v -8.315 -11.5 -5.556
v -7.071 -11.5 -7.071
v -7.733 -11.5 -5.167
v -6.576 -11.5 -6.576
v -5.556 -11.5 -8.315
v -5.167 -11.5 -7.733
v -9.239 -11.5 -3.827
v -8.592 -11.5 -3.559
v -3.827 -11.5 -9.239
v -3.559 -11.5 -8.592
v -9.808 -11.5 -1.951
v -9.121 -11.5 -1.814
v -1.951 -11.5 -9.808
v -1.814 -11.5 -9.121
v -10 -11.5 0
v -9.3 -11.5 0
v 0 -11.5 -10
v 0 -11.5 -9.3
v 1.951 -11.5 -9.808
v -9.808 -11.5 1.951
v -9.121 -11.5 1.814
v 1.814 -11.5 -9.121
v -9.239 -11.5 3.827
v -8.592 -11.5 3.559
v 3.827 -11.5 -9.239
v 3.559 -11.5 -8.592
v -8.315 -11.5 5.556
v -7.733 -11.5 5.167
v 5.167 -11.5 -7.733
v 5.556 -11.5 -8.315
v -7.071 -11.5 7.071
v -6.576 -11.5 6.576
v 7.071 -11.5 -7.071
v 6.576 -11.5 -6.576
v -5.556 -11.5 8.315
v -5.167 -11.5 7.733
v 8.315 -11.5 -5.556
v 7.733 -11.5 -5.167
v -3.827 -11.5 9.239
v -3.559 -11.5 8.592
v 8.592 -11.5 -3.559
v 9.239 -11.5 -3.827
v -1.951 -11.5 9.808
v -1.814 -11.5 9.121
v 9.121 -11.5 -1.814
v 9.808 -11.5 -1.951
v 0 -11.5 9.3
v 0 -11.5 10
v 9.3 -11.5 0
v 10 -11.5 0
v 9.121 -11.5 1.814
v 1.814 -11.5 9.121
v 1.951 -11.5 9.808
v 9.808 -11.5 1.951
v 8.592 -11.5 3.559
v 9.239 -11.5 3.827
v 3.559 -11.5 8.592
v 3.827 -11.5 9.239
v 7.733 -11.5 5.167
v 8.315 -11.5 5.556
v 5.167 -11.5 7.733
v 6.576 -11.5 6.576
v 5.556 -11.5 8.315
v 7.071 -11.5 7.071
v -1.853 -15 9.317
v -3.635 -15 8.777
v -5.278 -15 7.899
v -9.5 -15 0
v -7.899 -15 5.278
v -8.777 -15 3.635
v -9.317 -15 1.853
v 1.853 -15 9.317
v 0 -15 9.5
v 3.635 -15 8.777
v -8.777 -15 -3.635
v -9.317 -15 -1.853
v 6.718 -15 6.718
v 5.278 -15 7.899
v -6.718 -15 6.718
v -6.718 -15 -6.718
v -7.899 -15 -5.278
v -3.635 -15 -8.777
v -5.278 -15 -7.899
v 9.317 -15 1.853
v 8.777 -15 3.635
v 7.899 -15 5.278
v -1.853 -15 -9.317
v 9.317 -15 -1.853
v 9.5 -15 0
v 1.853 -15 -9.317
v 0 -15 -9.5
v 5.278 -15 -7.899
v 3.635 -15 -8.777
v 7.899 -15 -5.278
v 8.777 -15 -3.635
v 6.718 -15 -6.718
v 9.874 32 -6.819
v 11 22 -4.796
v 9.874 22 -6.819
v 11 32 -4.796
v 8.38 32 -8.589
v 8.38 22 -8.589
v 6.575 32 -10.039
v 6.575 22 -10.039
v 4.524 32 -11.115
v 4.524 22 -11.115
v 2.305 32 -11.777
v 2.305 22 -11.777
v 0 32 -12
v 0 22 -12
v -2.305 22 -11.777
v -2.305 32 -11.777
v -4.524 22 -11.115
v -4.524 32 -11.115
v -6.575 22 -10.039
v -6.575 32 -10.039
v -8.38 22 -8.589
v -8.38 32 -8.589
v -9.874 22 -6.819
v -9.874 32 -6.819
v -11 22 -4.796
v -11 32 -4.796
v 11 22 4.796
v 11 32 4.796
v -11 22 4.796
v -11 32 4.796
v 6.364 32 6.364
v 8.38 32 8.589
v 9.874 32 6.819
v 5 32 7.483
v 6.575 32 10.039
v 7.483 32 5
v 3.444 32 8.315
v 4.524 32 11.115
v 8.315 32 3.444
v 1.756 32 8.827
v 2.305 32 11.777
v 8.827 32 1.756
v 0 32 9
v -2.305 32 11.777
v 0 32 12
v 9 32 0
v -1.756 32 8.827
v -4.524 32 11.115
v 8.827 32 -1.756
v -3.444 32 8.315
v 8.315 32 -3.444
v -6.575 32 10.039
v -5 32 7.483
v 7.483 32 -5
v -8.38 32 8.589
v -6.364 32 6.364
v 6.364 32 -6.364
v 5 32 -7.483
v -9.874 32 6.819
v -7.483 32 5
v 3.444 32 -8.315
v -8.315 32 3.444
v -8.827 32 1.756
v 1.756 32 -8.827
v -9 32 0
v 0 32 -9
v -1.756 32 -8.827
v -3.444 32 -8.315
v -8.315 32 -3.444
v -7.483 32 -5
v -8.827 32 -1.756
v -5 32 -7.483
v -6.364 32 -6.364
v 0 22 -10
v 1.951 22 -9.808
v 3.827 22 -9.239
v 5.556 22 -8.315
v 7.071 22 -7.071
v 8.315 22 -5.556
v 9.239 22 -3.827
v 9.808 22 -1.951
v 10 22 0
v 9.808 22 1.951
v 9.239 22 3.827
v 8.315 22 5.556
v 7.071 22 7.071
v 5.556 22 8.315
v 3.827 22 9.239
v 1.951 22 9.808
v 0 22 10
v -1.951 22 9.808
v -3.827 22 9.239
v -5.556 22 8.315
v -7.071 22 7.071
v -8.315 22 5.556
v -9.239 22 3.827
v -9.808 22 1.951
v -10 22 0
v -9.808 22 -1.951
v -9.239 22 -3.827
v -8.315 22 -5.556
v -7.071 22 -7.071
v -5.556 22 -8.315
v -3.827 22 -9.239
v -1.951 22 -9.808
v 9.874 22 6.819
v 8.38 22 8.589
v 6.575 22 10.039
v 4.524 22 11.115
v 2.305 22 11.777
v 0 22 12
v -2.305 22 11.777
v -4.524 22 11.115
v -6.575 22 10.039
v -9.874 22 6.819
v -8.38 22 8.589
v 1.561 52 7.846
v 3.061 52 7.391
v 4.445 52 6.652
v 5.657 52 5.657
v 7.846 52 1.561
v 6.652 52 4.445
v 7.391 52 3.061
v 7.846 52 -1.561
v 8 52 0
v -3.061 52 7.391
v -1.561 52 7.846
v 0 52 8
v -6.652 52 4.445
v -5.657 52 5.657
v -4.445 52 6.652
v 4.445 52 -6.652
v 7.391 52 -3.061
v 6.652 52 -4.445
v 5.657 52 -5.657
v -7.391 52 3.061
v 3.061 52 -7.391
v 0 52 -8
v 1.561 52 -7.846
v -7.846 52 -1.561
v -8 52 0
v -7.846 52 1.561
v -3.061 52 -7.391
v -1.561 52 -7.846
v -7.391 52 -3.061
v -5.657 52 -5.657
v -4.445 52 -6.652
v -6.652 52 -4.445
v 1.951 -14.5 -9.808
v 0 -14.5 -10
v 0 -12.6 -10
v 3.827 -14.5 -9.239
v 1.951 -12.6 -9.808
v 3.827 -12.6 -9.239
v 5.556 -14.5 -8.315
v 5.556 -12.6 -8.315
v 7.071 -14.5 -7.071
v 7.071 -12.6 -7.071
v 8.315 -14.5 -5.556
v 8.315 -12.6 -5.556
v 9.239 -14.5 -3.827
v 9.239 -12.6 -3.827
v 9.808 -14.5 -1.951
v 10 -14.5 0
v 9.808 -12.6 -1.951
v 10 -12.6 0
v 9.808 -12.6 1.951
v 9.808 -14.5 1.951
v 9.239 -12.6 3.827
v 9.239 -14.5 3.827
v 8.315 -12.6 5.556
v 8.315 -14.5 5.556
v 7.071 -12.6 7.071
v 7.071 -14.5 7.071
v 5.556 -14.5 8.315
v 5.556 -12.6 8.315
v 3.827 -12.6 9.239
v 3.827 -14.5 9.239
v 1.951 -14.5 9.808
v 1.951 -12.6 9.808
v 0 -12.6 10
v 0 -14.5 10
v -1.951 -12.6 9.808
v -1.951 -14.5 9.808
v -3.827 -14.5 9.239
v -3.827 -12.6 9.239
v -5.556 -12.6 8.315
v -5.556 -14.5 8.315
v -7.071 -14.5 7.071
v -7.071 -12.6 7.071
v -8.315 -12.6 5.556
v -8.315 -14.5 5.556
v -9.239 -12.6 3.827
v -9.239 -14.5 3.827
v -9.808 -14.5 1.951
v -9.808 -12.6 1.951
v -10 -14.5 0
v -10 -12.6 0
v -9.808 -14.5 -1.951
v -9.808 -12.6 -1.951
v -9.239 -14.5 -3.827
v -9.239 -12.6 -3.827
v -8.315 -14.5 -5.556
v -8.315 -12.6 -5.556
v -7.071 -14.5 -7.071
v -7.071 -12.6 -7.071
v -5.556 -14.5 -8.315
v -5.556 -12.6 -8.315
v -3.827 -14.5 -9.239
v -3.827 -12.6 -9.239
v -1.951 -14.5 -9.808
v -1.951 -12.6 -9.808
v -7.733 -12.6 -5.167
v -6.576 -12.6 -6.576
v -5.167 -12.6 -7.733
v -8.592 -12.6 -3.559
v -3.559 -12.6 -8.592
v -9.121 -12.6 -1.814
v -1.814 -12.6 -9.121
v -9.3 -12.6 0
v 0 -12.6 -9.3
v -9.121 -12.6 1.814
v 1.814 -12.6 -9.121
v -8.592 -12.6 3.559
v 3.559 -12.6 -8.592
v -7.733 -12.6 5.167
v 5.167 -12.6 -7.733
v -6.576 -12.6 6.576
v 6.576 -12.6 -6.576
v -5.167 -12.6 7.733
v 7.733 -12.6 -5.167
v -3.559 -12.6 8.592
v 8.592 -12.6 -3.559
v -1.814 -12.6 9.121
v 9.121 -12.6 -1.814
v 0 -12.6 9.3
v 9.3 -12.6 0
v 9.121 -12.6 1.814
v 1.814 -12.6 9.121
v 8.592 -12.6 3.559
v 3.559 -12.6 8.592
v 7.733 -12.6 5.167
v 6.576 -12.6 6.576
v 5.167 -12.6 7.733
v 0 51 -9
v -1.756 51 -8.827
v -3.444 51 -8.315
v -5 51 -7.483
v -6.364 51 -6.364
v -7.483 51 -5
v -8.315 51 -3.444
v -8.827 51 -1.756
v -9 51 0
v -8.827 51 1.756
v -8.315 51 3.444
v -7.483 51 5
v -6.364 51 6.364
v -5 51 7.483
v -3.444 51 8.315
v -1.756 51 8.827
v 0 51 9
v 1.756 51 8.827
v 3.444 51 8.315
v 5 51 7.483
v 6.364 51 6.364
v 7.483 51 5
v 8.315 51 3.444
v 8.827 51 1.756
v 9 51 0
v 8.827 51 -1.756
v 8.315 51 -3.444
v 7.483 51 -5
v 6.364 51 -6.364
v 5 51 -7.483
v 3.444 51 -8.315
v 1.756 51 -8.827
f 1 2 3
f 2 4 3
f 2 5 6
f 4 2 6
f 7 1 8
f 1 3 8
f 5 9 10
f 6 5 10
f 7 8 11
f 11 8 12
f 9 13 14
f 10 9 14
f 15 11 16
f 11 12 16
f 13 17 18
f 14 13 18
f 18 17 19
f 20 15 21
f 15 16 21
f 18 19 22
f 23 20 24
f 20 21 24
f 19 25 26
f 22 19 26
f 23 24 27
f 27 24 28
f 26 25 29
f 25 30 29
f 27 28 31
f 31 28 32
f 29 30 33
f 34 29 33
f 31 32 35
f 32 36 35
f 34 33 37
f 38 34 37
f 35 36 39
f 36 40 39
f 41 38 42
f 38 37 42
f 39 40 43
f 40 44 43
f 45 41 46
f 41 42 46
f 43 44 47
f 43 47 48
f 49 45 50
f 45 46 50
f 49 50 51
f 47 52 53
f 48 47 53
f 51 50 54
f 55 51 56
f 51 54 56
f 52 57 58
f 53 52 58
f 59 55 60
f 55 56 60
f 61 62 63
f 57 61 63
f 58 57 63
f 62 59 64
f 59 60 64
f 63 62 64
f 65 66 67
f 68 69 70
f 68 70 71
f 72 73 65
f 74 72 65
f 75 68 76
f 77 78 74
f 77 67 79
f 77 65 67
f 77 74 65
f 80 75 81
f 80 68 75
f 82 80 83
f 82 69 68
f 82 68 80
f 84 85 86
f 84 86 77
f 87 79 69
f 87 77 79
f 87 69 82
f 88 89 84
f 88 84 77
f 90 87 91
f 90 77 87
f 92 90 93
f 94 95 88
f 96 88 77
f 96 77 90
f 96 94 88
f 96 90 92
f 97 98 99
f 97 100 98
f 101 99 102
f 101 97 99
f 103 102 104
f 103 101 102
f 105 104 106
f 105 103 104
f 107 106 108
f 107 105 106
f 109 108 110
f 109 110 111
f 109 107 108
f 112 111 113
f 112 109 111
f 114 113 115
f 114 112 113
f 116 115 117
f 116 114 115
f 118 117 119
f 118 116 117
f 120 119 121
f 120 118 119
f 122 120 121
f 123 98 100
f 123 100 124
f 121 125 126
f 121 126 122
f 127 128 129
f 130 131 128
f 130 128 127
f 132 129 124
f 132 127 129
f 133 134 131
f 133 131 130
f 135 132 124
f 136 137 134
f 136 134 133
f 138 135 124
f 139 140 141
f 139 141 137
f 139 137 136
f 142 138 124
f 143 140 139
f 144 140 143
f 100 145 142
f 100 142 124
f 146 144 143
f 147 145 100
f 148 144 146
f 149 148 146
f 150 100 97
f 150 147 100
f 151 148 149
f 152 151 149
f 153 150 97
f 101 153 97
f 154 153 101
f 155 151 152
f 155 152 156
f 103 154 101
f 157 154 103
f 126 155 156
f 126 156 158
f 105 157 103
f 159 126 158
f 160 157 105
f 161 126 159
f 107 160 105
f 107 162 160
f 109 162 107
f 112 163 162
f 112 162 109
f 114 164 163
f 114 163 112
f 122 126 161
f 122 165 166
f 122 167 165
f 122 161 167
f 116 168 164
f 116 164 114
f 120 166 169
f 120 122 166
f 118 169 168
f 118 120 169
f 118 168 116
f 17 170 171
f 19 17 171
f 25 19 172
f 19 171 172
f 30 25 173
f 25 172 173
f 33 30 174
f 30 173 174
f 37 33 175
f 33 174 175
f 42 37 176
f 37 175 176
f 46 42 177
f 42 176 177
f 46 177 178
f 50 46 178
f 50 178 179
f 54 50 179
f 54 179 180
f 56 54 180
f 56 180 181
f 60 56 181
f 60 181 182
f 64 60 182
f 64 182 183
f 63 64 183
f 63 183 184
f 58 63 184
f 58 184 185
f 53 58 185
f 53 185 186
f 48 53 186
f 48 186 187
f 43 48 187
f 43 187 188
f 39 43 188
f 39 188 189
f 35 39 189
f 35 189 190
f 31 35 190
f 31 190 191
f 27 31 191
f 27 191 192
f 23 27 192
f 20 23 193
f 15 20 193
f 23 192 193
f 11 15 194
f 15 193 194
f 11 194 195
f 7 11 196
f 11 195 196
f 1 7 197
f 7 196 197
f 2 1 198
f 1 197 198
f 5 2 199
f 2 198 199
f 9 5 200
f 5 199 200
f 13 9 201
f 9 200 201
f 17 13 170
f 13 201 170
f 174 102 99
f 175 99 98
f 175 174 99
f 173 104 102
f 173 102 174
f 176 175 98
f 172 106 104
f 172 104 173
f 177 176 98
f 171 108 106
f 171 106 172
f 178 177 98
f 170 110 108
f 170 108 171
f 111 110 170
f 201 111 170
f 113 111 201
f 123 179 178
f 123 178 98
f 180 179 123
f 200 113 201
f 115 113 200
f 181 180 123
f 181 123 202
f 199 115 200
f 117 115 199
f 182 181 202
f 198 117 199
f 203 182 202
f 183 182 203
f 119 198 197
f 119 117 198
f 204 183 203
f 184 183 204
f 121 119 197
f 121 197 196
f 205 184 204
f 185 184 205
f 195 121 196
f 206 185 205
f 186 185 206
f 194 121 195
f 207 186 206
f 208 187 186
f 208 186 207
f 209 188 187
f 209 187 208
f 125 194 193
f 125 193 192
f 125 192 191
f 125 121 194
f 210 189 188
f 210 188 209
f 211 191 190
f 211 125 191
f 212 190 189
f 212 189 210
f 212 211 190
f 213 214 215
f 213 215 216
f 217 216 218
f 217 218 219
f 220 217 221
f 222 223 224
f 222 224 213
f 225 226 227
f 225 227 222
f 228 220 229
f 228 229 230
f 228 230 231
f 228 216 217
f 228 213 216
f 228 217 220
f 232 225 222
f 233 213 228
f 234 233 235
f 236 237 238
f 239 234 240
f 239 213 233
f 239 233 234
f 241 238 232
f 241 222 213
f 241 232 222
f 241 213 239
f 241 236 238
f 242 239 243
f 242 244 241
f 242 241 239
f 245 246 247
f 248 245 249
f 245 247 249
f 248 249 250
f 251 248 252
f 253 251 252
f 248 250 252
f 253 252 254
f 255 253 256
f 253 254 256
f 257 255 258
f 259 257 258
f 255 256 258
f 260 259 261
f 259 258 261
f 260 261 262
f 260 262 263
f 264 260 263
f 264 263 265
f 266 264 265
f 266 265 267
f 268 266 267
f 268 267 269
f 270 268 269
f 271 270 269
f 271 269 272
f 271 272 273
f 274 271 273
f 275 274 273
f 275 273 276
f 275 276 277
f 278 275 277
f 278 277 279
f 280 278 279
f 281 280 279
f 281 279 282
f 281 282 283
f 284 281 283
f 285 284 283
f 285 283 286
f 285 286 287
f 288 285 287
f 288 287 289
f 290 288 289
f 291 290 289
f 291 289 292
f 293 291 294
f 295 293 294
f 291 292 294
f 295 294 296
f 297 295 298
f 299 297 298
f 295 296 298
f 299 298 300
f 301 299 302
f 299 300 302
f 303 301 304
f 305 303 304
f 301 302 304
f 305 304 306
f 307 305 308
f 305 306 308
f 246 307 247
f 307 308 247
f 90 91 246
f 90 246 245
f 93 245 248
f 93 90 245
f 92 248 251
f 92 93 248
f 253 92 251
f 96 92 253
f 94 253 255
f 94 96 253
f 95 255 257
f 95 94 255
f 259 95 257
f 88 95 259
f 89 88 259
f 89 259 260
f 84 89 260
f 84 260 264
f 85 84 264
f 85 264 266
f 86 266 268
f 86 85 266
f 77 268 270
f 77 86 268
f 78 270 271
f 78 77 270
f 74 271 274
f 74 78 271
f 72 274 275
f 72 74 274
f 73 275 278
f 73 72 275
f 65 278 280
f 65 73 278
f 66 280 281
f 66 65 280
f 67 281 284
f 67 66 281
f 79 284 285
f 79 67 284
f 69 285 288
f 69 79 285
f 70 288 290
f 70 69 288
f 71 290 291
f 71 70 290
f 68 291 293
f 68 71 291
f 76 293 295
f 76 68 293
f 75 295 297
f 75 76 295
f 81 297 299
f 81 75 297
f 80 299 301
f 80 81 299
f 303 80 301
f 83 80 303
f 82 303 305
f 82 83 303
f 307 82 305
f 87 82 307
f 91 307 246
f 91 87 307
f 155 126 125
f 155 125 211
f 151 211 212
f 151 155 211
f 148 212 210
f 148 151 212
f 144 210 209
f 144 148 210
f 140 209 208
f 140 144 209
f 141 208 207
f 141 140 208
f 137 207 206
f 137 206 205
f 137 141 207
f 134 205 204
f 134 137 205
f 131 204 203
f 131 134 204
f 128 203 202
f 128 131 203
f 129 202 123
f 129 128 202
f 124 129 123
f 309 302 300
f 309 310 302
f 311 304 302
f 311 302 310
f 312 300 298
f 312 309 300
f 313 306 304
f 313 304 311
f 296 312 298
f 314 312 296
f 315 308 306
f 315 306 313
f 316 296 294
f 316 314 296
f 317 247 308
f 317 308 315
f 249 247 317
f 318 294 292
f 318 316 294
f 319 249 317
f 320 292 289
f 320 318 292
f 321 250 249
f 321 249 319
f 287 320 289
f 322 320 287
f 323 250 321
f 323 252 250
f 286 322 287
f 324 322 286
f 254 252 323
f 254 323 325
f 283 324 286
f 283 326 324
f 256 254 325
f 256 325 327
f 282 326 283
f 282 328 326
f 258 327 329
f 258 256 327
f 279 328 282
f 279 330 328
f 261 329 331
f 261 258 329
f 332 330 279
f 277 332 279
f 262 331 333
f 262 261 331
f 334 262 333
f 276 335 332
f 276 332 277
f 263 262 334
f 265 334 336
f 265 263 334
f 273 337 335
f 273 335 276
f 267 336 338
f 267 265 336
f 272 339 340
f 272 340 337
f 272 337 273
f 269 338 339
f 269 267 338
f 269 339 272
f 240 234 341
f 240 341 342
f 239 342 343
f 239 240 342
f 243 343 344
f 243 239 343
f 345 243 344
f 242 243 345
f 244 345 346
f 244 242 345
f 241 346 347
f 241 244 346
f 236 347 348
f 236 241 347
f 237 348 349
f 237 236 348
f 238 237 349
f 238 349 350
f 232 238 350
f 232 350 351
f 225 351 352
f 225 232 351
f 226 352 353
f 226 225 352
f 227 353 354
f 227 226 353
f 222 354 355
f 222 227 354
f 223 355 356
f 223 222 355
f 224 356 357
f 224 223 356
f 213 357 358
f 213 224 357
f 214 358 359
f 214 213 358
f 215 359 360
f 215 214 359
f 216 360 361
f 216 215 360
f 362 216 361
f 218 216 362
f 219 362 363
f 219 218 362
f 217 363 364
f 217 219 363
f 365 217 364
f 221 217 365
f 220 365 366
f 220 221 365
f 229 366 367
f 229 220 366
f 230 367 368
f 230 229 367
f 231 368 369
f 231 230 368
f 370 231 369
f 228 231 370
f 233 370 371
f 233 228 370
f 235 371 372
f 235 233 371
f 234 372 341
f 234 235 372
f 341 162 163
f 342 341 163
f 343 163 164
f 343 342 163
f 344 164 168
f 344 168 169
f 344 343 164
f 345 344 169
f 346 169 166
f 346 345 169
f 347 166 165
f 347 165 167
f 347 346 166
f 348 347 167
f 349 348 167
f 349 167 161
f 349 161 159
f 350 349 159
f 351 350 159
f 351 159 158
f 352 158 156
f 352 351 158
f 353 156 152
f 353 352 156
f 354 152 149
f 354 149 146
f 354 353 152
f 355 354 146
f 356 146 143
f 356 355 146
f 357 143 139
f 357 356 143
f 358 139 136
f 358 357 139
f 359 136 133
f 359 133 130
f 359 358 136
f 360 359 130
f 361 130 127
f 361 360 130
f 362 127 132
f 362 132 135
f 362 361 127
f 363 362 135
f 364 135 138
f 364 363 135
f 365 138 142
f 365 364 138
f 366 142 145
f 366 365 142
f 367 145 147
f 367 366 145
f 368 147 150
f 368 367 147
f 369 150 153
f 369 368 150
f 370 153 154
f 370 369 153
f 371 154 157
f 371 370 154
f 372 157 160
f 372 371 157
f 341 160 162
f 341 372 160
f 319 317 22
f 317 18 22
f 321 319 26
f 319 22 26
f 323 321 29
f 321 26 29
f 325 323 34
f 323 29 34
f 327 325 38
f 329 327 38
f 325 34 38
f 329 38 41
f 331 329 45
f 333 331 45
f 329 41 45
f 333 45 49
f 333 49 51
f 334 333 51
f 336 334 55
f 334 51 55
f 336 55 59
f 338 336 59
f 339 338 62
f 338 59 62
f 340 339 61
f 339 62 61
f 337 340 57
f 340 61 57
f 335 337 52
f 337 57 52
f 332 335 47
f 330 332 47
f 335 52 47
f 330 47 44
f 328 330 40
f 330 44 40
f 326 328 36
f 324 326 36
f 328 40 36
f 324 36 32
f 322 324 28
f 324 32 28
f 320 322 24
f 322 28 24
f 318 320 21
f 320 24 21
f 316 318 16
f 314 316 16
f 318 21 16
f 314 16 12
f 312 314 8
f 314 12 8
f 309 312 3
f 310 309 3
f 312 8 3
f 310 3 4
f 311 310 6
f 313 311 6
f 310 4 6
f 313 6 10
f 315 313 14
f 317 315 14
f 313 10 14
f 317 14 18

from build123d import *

# Parameters (mm, degrees)
CHAMFER_1_SIZE      = 1
CUT_EXTRUDE_1_DEPTH = 37.221540553
SKETCH_3_R          = 10
EXTRUDE_1_DEPTH     = 15
CHAMFER_2_SIZE      = 0.5
SKETCH_7_W          = 0.7
SKETCH_7_H          = 1.1


with BuildPart() as part:
    # 草图1 → 旋转1 (revolve)
    with BuildSketch(Plane.XY, mode=Mode.PRIVATE) as revolve_1_sk:
        Polygon((0, 0), (10, 0), (10, 1.992934229), (10, 22), (12, 22), (12, 32), (9, 32), (9, 52), (0, 52), align=None)
    revolve(revolve_1_sk.sketch.rotate(Axis((0, 0, 0), (0, 1, 0)), 90), axis=Axis((0, 0, 0), (0, 1, 0)))

    # 倒角1
    chamfer_1_edges = [part.edges().sort_by_distance(p)[0] for p in [
        (0, 52, 9),
    ]]
    chamfer(chamfer_1_edges, length=CHAMFER_1_SIZE)

    # 草图2 → 切除-拉伸1 (cut, through all)
    with BuildSketch(Plane(origin=(0, 32, 0), x_dir=(1, 0, 0), z_dir=(0, 1, 0))):
        with BuildLine():
            Line((-11, -4.795831523), (-11, 4.795831523))
            ThreePointArc((-11, 4.795831523), (-12, 0), (-11, -4.795831523))
        make_face()
        with BuildLine():
            ThreePointArc((12, 0), (11.747340124, 2.449489743), (11, 4.795831523))
            Line((11, 4.795831523), (11, -4.795831523))
            ThreePointArc((11, -4.795831523), (11.747340124, -2.449489743), (12, 0))
        make_face()
    extrude(amount=-CUT_EXTRUDE_1_DEPTH, mode=Mode.SUBTRACT)

    # 草图3 → 凸台-拉伸1 (add)
    with BuildSketch(Plane.XZ):
        with Locations(Location((0, 0, 0), (0, 0, 270))):
            Circle(SKETCH_3_R)
    extrude(amount=EXTRUDE_1_DEPTH)

    # 倒角2
    chamfer_2_edges = [part.edges().sort_by_distance(p)[0] for p in [
        (0, -15, 10),
    ]]
    chamfer(chamfer_2_edges, length=CHAMFER_2_SIZE)

    # 草图7 → 切除-旋转1 (revolve, cut)
    with BuildSketch(Plane(origin=(0, 0, 0), x_dir=(0, 0, -1), z_dir=(1, 0, 0))):
        with Locations((9.65, -12.05)):
            Rectangle(SKETCH_7_W, SKETCH_7_H)
    revolve(axis=Axis((0, 52, 0), (0, -1, 0)), mode=Mode.SUBTRACT)


solid = part.part
